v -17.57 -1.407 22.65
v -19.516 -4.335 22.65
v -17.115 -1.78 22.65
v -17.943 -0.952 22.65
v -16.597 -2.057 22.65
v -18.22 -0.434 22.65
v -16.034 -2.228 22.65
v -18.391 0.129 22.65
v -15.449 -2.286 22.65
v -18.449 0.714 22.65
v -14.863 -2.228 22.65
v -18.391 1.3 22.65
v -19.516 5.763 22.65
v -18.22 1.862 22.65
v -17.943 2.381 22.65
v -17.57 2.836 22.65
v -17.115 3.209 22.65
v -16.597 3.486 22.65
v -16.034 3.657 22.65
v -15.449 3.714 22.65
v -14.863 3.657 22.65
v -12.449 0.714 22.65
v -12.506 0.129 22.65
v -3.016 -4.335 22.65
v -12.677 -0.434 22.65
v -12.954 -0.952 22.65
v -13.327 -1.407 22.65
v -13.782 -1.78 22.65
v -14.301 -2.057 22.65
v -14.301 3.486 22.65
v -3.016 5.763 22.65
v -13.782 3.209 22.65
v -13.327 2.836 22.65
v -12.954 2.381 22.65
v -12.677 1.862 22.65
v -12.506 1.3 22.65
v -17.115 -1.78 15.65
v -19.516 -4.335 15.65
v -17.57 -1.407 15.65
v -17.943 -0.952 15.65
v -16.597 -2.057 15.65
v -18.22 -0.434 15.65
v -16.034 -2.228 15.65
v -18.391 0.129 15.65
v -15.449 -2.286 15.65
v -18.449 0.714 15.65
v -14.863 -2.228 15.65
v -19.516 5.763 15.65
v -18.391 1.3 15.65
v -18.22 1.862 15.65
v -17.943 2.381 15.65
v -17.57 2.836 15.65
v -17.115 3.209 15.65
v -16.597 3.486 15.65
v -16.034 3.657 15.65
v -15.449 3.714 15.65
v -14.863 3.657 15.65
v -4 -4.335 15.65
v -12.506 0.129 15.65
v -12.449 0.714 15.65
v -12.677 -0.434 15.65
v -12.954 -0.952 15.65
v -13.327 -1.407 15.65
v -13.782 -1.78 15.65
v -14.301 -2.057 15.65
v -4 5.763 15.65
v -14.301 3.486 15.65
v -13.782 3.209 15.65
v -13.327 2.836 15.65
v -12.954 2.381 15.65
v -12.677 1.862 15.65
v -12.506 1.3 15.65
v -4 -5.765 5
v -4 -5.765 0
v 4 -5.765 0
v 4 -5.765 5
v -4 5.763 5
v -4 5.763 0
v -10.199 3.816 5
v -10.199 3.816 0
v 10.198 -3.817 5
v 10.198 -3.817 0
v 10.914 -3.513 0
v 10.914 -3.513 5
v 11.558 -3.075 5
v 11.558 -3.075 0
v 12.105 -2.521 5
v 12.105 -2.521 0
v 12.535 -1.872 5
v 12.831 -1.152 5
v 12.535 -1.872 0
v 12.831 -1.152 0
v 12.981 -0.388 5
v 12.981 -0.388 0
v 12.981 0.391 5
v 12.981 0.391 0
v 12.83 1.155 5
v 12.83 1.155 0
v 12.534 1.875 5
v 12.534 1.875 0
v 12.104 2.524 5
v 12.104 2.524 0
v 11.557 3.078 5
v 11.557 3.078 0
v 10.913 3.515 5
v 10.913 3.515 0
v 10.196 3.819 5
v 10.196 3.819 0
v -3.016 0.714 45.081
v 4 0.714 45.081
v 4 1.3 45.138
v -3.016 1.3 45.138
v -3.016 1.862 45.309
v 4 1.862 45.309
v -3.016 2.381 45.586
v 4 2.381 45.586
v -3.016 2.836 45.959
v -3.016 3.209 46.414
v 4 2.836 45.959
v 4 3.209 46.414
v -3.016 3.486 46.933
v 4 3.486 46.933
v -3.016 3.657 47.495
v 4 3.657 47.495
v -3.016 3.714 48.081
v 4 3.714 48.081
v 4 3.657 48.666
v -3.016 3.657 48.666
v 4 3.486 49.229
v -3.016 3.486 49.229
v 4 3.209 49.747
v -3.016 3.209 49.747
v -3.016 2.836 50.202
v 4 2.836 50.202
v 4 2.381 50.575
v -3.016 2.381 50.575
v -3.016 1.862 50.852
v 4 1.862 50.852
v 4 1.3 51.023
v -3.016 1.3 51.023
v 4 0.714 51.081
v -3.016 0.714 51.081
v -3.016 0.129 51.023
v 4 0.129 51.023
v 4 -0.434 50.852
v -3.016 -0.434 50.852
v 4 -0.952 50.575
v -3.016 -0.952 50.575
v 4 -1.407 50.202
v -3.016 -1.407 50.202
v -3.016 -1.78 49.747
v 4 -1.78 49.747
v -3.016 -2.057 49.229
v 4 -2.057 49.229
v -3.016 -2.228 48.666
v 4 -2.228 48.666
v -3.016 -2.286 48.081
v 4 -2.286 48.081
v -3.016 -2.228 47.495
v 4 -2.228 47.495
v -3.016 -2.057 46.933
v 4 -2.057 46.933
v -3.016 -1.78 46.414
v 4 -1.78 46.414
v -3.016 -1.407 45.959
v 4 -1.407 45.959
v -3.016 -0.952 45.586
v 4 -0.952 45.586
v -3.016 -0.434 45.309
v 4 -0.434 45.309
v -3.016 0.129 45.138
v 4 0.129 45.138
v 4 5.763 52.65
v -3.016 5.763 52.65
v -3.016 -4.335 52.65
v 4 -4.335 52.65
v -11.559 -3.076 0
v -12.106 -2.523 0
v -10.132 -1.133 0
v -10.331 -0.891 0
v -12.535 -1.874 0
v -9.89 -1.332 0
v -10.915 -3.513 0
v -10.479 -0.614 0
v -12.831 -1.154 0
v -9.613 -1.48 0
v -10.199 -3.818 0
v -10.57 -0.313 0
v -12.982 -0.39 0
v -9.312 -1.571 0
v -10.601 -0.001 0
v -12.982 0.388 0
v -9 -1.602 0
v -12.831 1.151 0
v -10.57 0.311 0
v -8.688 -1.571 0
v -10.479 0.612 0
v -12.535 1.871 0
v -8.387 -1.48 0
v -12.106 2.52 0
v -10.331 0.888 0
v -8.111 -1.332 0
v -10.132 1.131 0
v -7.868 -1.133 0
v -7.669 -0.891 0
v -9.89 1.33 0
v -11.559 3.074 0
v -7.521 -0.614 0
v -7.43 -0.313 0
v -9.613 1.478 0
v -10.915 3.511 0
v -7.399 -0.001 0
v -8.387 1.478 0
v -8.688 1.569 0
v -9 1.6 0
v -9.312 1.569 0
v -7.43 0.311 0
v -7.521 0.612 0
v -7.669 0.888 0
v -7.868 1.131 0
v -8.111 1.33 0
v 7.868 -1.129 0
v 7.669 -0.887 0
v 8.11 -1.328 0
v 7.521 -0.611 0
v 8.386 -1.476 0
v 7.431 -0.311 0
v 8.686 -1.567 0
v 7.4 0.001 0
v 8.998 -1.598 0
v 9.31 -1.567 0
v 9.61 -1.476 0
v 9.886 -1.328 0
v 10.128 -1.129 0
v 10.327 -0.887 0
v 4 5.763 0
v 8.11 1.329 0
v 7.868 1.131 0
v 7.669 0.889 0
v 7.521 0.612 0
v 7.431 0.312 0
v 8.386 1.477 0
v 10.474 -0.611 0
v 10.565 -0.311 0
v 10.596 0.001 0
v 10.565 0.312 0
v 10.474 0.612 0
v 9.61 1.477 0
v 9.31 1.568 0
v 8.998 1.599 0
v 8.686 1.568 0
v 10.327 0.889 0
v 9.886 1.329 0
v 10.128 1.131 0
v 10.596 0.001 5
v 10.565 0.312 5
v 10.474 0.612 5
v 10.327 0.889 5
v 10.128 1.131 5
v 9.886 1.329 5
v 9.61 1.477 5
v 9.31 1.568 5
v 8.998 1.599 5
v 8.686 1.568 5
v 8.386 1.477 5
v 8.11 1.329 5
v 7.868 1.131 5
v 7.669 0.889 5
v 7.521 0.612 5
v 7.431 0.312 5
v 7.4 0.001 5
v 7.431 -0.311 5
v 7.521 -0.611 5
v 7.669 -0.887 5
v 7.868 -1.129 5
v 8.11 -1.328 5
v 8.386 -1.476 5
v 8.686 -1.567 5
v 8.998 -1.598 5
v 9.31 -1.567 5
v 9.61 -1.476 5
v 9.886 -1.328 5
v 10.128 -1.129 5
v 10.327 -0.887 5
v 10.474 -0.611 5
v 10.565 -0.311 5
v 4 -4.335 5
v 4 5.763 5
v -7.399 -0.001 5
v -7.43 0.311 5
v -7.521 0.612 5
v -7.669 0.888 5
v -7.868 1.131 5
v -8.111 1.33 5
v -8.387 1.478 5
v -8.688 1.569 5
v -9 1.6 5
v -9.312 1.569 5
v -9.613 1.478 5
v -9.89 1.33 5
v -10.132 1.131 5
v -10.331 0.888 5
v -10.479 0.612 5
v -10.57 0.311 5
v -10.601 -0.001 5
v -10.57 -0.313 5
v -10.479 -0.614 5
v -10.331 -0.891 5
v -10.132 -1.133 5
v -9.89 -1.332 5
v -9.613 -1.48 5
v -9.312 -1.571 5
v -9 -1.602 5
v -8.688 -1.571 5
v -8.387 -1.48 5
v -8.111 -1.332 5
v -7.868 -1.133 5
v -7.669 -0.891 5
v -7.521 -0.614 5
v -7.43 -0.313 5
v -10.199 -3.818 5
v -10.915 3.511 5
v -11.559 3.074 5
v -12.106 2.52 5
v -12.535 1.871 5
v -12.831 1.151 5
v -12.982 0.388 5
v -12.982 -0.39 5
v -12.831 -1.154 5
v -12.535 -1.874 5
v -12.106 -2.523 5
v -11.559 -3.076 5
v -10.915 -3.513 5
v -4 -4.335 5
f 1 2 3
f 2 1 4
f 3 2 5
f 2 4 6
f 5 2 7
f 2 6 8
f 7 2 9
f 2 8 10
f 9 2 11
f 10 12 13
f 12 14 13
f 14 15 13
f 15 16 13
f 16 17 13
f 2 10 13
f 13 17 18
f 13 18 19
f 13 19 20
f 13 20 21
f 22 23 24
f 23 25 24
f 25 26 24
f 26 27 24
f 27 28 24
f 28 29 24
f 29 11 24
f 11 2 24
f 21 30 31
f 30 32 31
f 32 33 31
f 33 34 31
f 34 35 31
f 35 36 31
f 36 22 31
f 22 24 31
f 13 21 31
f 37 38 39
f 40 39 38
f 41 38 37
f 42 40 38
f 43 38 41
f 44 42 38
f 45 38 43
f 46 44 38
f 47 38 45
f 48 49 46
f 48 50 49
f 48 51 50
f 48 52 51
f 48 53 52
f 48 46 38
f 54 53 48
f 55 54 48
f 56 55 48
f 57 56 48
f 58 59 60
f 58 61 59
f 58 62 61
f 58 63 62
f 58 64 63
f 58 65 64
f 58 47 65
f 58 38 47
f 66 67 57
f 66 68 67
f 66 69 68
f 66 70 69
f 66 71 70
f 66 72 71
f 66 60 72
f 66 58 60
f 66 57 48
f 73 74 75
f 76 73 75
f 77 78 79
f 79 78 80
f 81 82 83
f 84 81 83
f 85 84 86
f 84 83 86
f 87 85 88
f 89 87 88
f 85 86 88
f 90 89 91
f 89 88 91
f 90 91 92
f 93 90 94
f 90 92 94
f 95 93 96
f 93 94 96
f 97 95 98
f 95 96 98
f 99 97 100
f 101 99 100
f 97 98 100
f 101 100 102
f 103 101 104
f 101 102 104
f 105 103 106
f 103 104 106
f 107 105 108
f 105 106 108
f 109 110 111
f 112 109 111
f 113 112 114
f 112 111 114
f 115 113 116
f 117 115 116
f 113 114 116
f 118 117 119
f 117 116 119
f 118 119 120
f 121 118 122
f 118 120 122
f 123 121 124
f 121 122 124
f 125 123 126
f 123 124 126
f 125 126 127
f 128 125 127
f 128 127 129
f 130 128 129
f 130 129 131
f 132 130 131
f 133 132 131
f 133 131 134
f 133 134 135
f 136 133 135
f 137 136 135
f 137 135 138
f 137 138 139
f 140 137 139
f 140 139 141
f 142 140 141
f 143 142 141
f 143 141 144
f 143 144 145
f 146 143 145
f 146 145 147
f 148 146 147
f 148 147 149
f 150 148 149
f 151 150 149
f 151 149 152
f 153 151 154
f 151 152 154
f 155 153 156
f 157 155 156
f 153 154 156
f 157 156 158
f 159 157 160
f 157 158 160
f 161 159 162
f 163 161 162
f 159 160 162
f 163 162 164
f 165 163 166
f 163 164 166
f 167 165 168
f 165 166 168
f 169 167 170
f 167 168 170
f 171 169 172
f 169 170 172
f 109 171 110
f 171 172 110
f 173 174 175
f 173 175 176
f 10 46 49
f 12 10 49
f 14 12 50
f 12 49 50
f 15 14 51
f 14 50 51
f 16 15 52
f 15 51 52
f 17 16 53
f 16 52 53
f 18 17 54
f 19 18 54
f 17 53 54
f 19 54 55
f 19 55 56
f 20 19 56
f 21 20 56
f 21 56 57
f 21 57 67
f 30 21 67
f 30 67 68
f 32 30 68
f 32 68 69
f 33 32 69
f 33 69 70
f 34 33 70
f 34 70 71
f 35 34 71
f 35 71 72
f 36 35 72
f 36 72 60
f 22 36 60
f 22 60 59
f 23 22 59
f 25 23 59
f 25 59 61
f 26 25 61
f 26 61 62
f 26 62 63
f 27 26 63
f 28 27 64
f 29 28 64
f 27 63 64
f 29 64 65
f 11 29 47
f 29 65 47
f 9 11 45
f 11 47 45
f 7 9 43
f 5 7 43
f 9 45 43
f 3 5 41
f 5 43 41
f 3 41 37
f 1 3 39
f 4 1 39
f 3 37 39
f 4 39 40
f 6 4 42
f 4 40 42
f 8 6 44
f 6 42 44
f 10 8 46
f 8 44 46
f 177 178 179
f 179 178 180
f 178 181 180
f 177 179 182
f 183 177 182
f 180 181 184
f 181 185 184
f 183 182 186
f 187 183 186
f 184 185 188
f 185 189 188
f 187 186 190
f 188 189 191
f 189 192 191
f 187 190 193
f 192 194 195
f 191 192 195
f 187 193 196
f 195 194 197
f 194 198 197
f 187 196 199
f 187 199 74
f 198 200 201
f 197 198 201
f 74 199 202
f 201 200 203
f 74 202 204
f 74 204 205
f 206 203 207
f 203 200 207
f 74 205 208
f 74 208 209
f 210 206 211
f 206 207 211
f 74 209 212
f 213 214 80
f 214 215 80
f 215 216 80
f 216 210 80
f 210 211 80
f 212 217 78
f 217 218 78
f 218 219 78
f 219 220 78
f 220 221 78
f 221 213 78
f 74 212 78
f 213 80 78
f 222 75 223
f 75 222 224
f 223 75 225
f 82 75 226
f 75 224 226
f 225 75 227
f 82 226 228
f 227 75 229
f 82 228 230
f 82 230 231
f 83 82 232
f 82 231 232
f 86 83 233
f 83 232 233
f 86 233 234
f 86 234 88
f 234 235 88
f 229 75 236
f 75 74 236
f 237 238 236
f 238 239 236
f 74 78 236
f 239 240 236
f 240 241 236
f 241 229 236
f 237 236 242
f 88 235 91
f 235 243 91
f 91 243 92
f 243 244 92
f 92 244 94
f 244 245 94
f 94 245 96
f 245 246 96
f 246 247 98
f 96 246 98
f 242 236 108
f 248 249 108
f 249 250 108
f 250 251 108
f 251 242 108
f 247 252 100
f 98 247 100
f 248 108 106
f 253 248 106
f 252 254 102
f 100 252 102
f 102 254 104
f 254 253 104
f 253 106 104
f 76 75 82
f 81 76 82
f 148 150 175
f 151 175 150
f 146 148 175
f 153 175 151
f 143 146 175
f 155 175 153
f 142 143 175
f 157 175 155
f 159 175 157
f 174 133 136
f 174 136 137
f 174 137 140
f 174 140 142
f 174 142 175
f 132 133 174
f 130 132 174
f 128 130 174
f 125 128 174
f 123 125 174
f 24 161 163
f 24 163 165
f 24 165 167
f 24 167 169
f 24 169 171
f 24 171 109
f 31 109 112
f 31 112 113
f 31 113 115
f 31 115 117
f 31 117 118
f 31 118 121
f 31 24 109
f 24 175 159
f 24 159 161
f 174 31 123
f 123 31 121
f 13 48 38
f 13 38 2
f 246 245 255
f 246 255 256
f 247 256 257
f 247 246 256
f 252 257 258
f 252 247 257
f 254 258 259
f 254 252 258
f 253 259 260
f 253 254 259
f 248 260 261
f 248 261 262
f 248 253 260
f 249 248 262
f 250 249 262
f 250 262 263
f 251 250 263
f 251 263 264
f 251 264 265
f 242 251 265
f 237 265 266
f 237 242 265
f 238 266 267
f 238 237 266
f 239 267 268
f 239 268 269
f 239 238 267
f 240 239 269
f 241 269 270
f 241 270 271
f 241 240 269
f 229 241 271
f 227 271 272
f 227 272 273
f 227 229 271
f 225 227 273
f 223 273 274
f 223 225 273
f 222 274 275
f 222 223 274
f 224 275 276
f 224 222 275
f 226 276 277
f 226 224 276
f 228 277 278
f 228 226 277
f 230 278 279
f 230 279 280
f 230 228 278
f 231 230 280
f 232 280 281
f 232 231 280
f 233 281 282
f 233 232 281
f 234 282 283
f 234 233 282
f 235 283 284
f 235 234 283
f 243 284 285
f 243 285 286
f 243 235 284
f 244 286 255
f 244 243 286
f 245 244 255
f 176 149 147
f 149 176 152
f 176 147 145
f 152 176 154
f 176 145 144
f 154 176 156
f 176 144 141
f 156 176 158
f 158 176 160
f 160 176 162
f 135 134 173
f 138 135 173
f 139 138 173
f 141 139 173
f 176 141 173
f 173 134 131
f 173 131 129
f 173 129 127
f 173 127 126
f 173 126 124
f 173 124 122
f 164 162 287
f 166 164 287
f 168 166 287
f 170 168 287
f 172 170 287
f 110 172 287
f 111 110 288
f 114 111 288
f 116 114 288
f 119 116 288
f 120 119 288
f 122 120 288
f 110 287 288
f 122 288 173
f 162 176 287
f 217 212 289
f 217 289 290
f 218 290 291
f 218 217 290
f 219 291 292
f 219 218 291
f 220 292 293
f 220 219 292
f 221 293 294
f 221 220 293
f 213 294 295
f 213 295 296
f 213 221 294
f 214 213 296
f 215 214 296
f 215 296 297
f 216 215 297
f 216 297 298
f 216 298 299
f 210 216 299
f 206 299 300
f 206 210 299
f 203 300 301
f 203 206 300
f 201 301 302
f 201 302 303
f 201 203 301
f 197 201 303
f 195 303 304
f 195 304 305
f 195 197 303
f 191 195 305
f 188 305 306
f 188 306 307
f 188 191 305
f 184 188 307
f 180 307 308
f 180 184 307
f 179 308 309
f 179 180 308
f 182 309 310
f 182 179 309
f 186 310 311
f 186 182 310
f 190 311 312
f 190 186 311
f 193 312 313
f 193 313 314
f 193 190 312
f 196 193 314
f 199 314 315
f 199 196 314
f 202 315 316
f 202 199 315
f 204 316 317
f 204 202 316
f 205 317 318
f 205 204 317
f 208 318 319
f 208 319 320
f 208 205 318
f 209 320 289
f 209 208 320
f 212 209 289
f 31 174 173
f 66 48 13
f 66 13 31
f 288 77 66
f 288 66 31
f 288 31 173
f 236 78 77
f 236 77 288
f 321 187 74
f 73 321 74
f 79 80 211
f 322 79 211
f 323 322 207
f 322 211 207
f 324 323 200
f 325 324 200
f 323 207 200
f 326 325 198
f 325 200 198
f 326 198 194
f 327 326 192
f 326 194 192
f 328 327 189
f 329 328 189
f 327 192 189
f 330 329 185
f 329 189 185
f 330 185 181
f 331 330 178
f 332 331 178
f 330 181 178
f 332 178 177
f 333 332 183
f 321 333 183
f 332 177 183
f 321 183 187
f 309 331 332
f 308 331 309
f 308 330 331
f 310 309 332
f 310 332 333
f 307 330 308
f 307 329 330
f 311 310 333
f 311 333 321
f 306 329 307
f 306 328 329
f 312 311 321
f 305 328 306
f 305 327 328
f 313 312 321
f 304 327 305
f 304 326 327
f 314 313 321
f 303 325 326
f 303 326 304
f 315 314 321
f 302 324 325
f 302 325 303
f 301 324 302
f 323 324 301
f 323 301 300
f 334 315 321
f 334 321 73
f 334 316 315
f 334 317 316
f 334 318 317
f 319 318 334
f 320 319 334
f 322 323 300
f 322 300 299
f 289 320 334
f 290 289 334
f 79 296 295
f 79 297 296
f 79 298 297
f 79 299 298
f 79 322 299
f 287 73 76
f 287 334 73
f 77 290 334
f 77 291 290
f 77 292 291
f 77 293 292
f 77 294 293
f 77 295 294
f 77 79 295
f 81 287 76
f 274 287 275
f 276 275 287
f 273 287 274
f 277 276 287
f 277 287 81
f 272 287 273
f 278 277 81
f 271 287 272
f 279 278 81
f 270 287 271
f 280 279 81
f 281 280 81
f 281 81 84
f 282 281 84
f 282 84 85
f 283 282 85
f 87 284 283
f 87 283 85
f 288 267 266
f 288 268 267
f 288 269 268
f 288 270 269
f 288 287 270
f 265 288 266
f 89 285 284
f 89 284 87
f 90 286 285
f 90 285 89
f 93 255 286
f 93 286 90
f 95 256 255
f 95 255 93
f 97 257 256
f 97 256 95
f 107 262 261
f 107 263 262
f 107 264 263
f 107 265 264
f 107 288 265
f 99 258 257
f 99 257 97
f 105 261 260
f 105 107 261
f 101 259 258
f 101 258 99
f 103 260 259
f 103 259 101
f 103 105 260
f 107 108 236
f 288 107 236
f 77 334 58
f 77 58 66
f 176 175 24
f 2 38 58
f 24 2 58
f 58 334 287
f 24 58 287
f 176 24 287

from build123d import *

# Parameters (mm, degrees)
ESBO_O1_R                = 1.598160281
ESBO_O1_R_2              = 1.600993429
RESSALTO_EXTRUS_O1_DEPTH = 5
ESBO_O2_W                = 8.00000038
ESBO_O2_H                = 10.097505558
RESSALTO_EXTRUS_O2_DEPTH = 17.65
ESBO_O3_W                = 7
ESBO_O3_H                = 10.097505558
RESSALTO_EXTRUS_O3_DEPTH = 15.515714
ESBO_O4_R                = 3
CORTE_EXTRUS_O1_DEPTH    = 13
ESBO_O5_W                = 7.0157148
ESBO_O5_H                = 10.097505558
RESSALTO_EXTRUS_O4_DEPTH = 30
ESBO_O6_R                = 3
CORTE_EXTRUS_O2_DEPTH    = 30


with BuildPart() as part:
    # Esboço1 → Ressalto-extrusão1 (new body)
    with BuildSketch(Plane.XY):
        with BuildLine():
            Line((-10.199065979, -3.817665654), (-4.00000019, -5.764999893))
            Line((-4.00000019, -5.764999893), (4.00000019, -5.764999893))
            Line((4.00000019, -5.764999893), (10.197782, -3.817301838))
            ThreePointArc((10.197782, -3.817301838), (12.999977706, 0.001566069), (10.195969576, 3.8191034))
            Line((10.195969576, 3.8191034), (4.00000019, 5.763000809))
            Line((4.00000019, 5.763000809), (-4.00000019, 5.763000809))
            Line((-4.00000019, 5.763000809), (-10.199143851, 3.815503142))
            ThreePointArc((-10.199143851, 3.815503142), (-13.000622723, -0.001109837), (-10.199065979, -3.817665654))
        make_face()
        with Locations((8.997973452, 0.000616233)):
            Circle(ESBO_O1_R, mode=Mode.SUBTRACT)
        with Locations((-9.000145119, -0.001069025)):
            Circle(ESBO_O1_R_2, mode=Mode.SUBTRACT)
    extrude(amount=RESSALTO_EXTRUS_O1_DEPTH)

    # Esboço2 → Ressalto-extrusão2 (add)
    with BuildSketch(Plane.XY.offset(5)):
        with Locations((0, 0.71424803)):
            Rectangle(ESBO_O2_W, ESBO_O2_H)
    extrude(amount=RESSALTO_EXTRUS_O2_DEPTH)

    # Esboço3 → Ressalto-extrusão3 (add)
    with BuildSketch(Plane.ZY.offset(4.00000019)):
        with Locations((19.15, 0.71424803)):
            Rectangle(ESBO_O3_W, ESBO_O3_H)
    extrude(amount=RESSALTO_EXTRUS_O3_DEPTH)

    # Esboço4 → Corte-extrusão1 (cut)
    with BuildSketch(Plane(origin=(0, 0, 15.65), x_dir=(-1, 0, 0), z_dir=(0, 0, -1))):
        with Locations((15.448687317, 0.71424803)):
            Circle(ESBO_O4_R)
    extrude(amount=-CORTE_EXTRUS_O1_DEPTH, mode=Mode.SUBTRACT)

    # Esboço5 → Ressalto-extrusão4 (add)
    with BuildSketch(Plane.XY.offset(22.65)):
        with Locations((0.49214279, 0.71424803)):
            Rectangle(ESBO_O5_W, ESBO_O5_H)
    extrude(amount=RESSALTO_EXTRUS_O4_DEPTH)

    # Esboço6 → Corte-extrusão2 (cut)
    with BuildSketch(Plane(origin=(4.00000019, 0, 0), x_dir=(0, 0, -1), z_dir=(1, 0, 0))):
        with Locations((-48.08055434, 0.71424803)):
            Circle(ESBO_O6_R)
    extrude(amount=-CORTE_EXTRUS_O2_DEPTH, mode=Mode.SUBTRACT)


solid = part.part
